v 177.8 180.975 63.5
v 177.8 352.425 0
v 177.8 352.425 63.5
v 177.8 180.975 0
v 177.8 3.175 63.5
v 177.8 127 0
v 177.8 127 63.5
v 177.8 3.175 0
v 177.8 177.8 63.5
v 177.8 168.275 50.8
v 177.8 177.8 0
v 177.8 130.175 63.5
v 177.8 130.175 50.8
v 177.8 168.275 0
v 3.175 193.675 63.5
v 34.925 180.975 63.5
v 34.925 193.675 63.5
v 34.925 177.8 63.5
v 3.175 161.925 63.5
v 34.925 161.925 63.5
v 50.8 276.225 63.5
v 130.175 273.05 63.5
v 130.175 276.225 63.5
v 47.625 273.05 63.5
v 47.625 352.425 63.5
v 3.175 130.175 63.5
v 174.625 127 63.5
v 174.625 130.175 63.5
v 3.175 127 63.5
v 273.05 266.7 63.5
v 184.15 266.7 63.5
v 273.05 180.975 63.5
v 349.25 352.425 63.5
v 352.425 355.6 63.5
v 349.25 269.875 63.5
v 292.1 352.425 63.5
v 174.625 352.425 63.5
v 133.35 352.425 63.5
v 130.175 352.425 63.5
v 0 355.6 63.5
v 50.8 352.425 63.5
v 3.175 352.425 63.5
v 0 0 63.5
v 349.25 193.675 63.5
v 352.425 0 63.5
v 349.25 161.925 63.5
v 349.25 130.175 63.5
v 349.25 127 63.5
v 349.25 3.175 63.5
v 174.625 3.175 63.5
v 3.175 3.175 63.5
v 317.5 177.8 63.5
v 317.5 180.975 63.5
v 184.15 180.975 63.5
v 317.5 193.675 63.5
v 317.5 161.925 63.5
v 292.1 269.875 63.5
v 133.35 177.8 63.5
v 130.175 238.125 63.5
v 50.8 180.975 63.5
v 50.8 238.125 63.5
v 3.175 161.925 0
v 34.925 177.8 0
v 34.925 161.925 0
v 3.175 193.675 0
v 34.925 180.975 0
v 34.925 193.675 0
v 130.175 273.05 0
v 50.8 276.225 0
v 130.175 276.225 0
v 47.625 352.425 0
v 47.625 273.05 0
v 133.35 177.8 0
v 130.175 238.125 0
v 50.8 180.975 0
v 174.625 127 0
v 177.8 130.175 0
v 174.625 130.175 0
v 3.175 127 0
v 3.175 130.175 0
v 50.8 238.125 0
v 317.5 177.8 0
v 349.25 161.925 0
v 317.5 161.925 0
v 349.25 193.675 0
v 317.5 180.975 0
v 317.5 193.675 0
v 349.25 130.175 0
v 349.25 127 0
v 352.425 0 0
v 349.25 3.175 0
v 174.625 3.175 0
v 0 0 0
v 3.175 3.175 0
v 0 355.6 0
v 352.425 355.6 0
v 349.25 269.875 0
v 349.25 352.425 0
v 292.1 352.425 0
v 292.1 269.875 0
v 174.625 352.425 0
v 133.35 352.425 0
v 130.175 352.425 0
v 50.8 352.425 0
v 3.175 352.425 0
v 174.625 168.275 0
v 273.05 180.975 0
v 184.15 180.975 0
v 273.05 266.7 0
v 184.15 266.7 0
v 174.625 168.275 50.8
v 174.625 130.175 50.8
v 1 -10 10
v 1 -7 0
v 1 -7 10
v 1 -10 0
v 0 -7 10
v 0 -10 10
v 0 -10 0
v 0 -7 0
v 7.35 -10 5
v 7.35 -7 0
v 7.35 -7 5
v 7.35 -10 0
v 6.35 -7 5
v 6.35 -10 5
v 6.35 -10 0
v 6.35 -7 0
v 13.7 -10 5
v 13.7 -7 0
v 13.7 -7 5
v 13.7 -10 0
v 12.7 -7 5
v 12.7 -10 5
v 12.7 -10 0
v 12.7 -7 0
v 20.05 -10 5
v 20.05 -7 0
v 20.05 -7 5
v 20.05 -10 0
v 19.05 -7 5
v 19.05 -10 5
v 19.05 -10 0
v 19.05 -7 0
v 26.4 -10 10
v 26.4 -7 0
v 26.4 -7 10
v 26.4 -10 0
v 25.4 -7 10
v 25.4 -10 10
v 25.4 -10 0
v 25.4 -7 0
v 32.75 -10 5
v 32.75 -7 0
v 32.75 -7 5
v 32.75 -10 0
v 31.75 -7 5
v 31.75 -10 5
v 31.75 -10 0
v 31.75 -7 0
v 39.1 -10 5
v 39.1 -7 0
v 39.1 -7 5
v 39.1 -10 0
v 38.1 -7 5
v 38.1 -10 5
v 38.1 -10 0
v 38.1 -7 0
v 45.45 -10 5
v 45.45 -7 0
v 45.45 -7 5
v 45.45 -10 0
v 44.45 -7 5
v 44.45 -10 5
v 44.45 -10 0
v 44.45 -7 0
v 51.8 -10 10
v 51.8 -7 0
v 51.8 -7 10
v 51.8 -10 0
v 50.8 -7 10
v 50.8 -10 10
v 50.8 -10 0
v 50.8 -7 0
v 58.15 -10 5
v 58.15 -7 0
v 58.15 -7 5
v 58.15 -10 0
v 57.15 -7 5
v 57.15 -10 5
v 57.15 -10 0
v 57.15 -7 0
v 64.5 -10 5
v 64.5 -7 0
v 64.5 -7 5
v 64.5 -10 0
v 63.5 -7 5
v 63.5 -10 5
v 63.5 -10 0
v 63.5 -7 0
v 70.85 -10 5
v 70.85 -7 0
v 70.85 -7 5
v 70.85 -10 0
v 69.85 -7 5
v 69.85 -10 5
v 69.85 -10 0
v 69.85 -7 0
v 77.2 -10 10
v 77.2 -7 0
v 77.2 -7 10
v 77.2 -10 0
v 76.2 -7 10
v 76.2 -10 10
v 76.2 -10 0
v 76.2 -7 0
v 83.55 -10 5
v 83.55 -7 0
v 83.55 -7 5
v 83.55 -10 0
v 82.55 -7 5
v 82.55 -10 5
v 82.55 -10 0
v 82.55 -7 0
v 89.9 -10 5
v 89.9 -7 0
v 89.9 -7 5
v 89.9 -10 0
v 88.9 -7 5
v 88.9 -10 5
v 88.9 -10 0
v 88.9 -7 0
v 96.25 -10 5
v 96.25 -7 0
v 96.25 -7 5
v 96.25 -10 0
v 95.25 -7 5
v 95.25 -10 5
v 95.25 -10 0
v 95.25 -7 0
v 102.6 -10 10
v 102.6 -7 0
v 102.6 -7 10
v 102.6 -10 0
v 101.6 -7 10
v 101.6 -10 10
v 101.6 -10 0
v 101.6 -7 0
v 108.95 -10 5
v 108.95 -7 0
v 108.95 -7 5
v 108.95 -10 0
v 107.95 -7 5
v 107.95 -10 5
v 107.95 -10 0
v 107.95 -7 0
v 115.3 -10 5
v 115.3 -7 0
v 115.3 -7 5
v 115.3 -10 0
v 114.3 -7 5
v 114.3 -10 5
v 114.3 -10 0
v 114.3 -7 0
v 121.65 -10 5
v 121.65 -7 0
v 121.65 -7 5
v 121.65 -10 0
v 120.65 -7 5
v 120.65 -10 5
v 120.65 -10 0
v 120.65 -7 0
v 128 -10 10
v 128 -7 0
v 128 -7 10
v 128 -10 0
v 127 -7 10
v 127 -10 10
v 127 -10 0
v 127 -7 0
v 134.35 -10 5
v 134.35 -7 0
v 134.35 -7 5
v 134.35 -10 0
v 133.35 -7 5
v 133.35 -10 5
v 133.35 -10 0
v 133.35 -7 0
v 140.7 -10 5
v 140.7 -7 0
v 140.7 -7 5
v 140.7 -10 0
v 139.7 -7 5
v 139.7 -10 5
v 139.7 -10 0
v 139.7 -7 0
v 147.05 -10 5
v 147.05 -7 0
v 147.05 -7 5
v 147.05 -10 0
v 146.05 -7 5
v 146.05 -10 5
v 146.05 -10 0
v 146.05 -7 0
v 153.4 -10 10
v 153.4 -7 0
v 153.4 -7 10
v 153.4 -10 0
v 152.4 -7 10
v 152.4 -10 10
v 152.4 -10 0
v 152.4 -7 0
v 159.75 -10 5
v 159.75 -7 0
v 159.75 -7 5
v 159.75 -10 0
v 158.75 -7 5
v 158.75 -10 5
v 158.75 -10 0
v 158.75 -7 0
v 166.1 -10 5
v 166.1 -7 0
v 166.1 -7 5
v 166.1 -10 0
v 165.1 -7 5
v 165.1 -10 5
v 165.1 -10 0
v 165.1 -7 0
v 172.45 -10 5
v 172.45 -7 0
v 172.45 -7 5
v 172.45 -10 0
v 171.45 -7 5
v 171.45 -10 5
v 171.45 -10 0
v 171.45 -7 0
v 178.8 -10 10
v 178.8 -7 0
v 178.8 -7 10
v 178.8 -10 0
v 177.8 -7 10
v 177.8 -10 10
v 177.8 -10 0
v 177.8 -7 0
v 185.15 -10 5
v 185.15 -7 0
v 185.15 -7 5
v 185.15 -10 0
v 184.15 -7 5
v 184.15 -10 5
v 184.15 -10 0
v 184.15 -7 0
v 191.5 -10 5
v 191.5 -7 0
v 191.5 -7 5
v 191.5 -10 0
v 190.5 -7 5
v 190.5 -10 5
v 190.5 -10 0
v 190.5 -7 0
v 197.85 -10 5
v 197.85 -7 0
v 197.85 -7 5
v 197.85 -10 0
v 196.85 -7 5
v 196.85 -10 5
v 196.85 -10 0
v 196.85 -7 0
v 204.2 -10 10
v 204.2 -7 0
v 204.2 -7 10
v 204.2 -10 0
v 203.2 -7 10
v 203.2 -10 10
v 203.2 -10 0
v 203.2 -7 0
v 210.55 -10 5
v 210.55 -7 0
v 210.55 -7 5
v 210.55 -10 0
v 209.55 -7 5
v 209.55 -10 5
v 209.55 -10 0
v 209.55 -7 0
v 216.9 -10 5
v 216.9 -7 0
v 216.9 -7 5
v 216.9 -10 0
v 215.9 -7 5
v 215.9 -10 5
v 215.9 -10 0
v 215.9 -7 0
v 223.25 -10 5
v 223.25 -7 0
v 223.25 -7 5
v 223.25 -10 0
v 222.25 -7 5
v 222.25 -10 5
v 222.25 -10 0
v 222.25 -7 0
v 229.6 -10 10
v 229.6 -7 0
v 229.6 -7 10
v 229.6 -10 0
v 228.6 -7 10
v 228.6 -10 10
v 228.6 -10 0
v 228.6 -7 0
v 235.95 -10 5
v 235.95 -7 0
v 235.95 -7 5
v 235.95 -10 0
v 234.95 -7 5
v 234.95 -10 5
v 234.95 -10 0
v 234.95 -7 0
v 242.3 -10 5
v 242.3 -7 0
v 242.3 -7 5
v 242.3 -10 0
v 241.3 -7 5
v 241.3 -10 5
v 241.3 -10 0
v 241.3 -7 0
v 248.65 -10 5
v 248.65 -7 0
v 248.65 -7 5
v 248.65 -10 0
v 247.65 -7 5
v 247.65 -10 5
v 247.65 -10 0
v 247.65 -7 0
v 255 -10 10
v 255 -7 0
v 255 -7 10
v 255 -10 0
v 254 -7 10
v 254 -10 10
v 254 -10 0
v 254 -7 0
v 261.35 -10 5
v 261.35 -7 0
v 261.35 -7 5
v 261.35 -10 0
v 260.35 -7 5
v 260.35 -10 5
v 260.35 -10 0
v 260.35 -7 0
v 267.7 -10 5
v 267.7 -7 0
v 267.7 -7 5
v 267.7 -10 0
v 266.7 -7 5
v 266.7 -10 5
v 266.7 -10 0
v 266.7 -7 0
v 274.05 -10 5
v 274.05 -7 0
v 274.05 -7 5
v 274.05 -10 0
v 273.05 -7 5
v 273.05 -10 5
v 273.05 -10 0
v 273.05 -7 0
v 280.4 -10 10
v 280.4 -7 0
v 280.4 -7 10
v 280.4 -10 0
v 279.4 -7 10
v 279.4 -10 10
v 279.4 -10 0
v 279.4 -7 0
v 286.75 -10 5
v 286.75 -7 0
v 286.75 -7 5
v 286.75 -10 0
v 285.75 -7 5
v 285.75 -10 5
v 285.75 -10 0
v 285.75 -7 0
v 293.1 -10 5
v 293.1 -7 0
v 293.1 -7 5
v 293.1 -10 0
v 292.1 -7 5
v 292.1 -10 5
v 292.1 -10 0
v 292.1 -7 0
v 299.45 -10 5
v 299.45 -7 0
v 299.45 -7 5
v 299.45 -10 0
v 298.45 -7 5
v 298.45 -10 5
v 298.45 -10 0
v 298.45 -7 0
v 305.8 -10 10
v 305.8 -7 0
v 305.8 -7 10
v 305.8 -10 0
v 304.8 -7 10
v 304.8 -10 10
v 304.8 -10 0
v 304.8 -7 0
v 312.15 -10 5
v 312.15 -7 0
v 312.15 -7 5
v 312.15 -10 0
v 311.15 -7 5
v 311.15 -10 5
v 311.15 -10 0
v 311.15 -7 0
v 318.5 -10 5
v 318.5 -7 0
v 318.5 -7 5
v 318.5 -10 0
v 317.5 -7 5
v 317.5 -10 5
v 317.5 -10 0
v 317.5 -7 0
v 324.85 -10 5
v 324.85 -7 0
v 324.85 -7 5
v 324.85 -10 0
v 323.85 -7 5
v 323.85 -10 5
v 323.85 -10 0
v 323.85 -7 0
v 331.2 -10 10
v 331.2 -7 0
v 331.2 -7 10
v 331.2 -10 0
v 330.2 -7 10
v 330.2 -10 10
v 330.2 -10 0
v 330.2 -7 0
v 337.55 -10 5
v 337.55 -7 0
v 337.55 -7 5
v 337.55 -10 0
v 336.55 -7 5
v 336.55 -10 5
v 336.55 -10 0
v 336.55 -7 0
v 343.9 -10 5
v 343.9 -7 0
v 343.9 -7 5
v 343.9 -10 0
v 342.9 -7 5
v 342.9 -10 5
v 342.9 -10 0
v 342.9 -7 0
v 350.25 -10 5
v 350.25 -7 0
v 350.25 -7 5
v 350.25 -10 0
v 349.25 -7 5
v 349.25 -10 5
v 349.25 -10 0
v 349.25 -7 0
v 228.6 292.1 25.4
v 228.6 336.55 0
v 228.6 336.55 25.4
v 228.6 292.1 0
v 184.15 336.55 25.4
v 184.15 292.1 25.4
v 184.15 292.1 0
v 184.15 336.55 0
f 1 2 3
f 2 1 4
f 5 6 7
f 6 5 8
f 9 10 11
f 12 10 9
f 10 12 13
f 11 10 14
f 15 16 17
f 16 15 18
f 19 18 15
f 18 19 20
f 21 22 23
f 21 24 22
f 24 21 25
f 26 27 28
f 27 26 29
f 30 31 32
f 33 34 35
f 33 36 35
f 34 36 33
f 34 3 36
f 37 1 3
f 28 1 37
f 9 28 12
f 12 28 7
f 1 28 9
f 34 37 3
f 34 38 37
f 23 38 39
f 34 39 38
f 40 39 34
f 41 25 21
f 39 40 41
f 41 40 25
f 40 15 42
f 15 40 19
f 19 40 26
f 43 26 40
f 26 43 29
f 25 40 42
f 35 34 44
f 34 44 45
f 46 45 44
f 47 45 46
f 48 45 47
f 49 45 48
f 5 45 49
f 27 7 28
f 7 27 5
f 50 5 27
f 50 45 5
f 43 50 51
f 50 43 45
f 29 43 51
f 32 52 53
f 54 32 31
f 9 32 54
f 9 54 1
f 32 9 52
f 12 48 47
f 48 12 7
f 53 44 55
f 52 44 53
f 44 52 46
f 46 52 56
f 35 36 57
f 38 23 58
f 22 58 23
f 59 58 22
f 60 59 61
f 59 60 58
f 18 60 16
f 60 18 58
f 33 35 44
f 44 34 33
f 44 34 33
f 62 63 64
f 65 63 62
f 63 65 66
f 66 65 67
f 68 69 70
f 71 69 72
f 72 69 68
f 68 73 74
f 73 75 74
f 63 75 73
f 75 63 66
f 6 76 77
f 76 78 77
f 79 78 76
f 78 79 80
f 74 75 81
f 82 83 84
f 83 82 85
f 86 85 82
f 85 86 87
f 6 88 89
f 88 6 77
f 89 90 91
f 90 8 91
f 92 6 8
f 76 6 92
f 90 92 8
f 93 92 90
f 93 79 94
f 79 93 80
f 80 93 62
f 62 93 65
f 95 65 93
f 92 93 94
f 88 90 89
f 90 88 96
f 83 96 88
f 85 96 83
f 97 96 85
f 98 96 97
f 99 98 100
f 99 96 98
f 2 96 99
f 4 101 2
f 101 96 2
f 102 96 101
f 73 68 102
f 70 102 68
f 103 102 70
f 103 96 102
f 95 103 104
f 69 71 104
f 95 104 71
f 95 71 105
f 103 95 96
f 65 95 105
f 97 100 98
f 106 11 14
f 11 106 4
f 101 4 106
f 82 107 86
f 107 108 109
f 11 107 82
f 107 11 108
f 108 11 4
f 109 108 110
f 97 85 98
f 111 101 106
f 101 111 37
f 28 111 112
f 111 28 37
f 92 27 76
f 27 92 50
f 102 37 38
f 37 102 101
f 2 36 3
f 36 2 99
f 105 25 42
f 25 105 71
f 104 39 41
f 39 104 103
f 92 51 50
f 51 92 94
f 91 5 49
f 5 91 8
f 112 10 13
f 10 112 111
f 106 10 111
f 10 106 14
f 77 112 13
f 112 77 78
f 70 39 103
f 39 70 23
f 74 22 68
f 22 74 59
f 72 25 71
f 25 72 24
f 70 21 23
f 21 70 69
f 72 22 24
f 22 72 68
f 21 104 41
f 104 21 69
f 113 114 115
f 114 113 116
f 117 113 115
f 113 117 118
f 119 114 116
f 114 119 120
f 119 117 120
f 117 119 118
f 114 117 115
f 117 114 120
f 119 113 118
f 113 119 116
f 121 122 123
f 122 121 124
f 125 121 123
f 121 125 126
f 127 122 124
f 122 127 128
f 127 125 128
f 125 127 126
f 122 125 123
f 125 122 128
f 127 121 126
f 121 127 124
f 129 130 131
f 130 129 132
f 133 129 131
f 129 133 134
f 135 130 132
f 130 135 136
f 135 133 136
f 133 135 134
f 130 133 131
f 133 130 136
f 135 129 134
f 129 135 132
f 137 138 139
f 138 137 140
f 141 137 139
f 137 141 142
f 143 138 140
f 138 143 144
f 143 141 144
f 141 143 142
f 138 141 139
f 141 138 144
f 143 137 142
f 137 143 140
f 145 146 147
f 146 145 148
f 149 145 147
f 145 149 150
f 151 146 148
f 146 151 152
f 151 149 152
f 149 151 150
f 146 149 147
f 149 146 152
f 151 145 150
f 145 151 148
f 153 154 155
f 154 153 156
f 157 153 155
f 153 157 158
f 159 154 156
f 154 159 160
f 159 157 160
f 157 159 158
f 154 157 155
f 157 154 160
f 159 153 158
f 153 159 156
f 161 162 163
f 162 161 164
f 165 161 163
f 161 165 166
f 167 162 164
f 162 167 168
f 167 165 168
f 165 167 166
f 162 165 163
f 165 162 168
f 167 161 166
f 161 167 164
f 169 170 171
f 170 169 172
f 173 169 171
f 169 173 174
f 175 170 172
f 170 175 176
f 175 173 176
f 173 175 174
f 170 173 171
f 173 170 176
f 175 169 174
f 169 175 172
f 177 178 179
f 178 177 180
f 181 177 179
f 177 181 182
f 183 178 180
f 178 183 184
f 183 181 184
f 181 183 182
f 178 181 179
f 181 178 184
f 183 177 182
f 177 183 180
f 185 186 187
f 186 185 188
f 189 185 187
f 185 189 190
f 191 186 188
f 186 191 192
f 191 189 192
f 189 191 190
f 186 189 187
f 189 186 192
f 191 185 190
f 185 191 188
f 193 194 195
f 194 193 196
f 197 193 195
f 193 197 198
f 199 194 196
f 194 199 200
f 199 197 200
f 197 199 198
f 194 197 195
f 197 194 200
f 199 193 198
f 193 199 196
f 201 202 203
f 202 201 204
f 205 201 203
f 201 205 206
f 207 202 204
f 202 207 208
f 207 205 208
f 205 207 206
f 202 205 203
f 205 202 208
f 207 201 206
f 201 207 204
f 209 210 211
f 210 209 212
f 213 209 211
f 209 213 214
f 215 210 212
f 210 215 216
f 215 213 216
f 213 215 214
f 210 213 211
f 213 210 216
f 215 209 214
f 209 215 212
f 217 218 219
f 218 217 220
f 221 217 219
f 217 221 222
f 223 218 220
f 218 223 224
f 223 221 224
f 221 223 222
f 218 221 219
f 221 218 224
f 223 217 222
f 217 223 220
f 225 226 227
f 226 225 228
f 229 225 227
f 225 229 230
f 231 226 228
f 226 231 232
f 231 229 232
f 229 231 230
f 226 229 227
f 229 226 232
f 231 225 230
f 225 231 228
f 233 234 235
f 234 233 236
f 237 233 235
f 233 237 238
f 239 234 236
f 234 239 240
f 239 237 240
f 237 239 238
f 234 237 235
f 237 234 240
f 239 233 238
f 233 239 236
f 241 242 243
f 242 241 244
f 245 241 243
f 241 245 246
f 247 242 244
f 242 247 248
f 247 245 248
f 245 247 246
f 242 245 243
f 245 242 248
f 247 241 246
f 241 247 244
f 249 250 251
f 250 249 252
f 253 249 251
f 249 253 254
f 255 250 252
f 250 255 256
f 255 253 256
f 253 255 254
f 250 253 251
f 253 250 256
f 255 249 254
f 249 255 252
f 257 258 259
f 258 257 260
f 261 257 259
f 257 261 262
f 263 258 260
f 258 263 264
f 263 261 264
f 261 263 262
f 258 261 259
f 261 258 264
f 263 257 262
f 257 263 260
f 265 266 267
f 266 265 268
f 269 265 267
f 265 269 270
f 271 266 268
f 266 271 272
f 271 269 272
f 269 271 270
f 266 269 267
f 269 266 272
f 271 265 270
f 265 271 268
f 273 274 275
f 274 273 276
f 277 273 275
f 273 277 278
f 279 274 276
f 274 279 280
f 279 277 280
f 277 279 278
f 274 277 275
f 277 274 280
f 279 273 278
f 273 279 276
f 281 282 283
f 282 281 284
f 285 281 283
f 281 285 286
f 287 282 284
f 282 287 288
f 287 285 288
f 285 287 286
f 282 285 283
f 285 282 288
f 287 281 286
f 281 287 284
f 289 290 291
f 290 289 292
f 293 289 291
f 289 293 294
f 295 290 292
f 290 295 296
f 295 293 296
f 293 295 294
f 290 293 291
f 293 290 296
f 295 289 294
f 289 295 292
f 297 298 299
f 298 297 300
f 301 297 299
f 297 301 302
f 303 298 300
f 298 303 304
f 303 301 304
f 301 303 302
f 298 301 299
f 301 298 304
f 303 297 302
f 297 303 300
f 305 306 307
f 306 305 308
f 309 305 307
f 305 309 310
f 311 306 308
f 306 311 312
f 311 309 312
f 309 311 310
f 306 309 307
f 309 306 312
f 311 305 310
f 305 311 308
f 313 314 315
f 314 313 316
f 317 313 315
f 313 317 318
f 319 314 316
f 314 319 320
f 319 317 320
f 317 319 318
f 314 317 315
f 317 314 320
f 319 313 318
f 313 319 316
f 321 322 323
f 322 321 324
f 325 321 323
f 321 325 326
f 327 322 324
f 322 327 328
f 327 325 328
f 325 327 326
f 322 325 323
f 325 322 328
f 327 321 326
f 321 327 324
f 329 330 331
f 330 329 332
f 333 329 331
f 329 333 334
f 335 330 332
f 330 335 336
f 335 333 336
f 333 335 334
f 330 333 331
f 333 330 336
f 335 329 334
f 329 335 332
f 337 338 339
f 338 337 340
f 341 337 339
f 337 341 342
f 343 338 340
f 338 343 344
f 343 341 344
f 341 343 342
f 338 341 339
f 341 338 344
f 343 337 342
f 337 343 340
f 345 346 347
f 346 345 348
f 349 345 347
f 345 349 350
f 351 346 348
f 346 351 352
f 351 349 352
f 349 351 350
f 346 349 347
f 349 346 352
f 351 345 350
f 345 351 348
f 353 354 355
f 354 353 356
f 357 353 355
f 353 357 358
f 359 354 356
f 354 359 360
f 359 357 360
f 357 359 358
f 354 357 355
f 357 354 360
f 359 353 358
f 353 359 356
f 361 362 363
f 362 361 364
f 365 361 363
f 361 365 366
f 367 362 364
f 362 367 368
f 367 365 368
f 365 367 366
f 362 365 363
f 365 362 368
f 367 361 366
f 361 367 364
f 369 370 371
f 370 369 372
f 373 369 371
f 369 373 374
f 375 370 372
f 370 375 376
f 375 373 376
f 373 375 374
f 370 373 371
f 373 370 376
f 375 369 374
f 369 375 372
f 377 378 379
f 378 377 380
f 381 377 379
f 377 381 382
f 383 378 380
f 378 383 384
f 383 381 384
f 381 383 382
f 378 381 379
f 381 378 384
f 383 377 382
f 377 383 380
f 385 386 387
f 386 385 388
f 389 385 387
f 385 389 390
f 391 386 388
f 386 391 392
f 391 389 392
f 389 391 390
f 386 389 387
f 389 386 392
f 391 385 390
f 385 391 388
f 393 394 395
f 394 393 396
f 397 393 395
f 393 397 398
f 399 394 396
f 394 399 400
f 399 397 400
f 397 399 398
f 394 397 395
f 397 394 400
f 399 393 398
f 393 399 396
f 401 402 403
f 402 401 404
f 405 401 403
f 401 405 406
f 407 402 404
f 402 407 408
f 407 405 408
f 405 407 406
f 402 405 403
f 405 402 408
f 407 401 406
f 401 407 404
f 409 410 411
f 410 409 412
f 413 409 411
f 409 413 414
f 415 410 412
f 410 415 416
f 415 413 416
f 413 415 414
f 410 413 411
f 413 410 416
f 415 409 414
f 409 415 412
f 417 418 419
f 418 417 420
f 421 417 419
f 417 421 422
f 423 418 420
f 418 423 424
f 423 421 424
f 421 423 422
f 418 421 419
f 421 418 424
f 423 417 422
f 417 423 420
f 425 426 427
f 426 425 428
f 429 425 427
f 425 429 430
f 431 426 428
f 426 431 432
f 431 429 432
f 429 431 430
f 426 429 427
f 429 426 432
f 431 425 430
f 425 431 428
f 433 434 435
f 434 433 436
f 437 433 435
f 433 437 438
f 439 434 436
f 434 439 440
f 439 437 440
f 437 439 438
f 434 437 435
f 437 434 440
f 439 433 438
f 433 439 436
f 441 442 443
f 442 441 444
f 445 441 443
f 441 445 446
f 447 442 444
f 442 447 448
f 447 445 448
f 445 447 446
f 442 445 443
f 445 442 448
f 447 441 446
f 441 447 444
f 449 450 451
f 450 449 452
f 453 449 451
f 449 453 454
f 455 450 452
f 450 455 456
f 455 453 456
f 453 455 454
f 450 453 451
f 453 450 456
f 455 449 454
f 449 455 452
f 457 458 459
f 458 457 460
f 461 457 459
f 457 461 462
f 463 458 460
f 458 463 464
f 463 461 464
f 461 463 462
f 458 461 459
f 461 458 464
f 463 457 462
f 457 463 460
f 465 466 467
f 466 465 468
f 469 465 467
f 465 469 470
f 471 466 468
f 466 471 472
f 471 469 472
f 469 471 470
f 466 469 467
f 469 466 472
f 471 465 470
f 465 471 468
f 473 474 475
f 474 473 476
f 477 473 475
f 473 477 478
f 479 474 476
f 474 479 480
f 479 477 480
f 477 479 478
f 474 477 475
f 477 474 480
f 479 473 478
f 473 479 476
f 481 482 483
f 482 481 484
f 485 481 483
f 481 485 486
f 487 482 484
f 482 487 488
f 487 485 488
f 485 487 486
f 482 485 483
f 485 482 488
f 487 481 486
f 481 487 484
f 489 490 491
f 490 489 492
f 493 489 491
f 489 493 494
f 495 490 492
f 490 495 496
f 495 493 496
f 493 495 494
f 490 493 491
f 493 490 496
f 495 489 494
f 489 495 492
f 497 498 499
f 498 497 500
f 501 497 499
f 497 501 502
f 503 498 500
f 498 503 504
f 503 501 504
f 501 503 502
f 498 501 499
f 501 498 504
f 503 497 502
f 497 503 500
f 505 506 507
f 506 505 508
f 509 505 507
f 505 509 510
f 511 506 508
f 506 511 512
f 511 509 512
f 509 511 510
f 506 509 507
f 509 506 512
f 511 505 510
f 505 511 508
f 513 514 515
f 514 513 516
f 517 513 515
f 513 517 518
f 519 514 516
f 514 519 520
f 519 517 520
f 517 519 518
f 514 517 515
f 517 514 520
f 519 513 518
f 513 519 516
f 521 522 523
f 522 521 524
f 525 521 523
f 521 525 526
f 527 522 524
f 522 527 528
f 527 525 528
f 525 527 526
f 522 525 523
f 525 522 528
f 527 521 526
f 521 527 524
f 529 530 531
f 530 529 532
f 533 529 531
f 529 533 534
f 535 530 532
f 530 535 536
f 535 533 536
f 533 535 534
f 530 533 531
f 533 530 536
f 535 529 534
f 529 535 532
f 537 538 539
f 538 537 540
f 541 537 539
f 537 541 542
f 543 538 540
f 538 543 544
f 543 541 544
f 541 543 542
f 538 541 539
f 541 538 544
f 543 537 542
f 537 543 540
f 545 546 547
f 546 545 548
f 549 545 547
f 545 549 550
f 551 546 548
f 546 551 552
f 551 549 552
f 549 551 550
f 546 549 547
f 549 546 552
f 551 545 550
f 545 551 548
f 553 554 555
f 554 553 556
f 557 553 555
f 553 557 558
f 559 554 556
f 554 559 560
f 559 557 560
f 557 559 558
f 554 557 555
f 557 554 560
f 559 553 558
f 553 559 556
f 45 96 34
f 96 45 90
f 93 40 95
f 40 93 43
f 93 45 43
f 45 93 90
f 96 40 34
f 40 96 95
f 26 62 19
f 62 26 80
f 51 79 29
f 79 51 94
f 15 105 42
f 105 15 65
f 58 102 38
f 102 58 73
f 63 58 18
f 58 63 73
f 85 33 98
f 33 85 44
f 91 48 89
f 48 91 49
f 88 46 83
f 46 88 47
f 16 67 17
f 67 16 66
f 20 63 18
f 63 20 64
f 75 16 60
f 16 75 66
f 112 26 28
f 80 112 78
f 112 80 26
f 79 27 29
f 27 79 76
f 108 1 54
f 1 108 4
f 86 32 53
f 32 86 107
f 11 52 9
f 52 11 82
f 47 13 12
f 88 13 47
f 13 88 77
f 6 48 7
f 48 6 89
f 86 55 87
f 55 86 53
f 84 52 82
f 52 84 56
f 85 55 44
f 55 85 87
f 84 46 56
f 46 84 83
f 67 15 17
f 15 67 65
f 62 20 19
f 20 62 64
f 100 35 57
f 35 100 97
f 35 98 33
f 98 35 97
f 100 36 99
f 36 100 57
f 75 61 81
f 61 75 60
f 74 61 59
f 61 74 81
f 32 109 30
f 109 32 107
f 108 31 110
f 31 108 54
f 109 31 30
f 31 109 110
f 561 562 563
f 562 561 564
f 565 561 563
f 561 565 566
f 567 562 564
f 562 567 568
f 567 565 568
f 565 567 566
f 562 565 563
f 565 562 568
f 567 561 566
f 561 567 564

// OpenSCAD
roomsize = 27;
wallthickness = .5; // In feet
scalefactor = 6.35; // scale factor - 1 foot eq 1/4 inch
wallheight = 10;
elevatorsize = 5;
closetsize = 14;
bathroomdepth=13;
bathroomwidth=9;
kingbedsize = 7;
stairsize = 5;

backwalloffset = wallthickness + roomsize + wallthickness + roomsize + wallthickness;
interiorwallsize = roomsize + wallthickness + roomsize + wallthickness;
halfinteriorwallsize = wallthickness + roomsize + wallthickness;
farsidewallposition = wallthickness + roomsize + wallthickness + roomsize;

module bfwall()
{
     backwallsize = wallthickness + roomsize + wallthickness + roomsize + wallthickness;
     cube([backwallsize * scalefactor,wallthickness*scalefactor,wallheight*scalefactor]);
}
module midsidewall()
{
     cube([wallthickness * scalefactor,interiorwallsize*scalefactor,wallheight*scalefactor]);
}

module midhalfsidewall()
{
     cube([wallthickness * scalefactor,halfinteriorwallsize*scalefactor,wallheight*scalefactor]);
}

module midroomdivider()
{
     cube([roomsize * scalefactor,wallthickness * scalefactor,wallheight*scalefactor]);
}

module utilityroomdivider()
{
     cube([(roomsize - 11.5) * scalefactor,wallthickness * scalefactor,wallheight*scalefactor]);
}

module elevator()
{
     cube([elevatorsize * scalefactor,elevatorsize * scalefactor, wallheight*scalefactor]);

}

module bathroom()
{

    cube([bathroomdepth * scalefactor, bathroomwidth * scalefactor, wallheight * scalefactor]);

}

module kingbed()
{
      cube([7 * scalefactor, 7 * scalefactor, 4 * scalefactor]);   
}

module closet()
{
      cube([closetsize * scalefactor, closetsize * scalefactor, wallheight * scalefactor]);
}

module stairs()
{
   cube([stairsize * scalefactor, stairsize * scalefactor, wallheight * scalefactor]);

}

module interiordoubledoor()
{
     rotate([0,0,90]) cube([(60/12) * scalefactor,(wallthickness * scalefactor) + 5,(80 / 12) * scalefactor]);

}

module storageroom()
{
       cube([13 * scalefactor, wallthickness * scalefactor, wallheight * scalefactor]);
       cube([wallthickness * scalefactor, 13 * scalefactor, wallheight * scalefactor]);

}

module hallwayopening()
{
    cube([(wallthickness + 2) * scalefactor, 6 * scalefactor, 8 * scalefactor]);

}

translate([0,0,0]) bfwall(); // Front Wall
translate([0,backwalloffset * scalefactor,0]) bfwall();
midwallposition = wallthickness + roomsize;
translate([0,wallthickness * scalefactor,0]) midsidewall();
difference(){
    translate([midwallposition * scalefactor,wallthickness * scalefactor,0]) midsidewall();
    translate([(midwallposition * scalefactor)-1,(wallthickness + roomsize + wallthickness - 7.5) * scalefactor,0]) hallwayopening(); 
    }
// Hallway
midhalfwallposition = wallthickness + roomsize;
translate([(midhalfwallposition - 7) * scalefactor,(wallthickness + roomsize + wallthickness) * scalefactor,0]) midhalfsidewall();

translate([farsidewallposition * scalefactor,wallthickness * scalefactor,0]) midsidewall();
roomdivposition = wallthickness + roomsize + wallthickness;
translate([(wallthickness + 5) * scalefactor,roomdivposition * scalefactor,0]) utilityroomdivider();
translate([wallthickness * scalefactor,(roomdivposition - 8) * scalefactor,0]) midroomdivider();
translate([(wallthickness + roomsize + wallthickness) * scalefactor,roomdivposition * scalefactor,0]) midroomdivider();
translate([(wallthickness + roomsize + wallthickness) * scalefactor,(roomdivposition - 8) * scalefactor,0]) midroomdivider();
elevatorpositionx = wallthickness + roomsize + wallthickness + roomsize - elevatorsize;
elevatorpositiony = wallthickness + roomsize + wallthickness - (elevatorsize / 2);

translate([elevatorpositionx * scalefactor,elevatorpositiony * scalefactor,0]) elevator();

stairpositionx = wallthickness;
stairpositiony = wallthickness + roomsize + wallthickness - (stairsize / 2);

translate([stairpositionx * scalefactor,stairpositiony * scalefactor,0]) stairs();


firstbathroompositionx = wallthickness + roomsize + wallthickness + roomsize - bathroomwidth;
firstbathroompositiony = wallthickness + roomsize + wallthickness + roomsize + wallthickness;

translate([firstbathroompositionx * scalefactor,firstbathroompositiony * scalefactor,0]) rotate([0,0,-90]) bathroom();

secondbathroompositionx = wallthickness + roomsize - bathroomwidth - wallthickness -  10;
secondbathroompositiony = wallthickness + roomsize + wallthickness + wallthickness;

translate([secondbathroompositionx * scalefactor,secondbathroompositiony * scalefactor,0]) bathroom();



closetpositionx = wallthickness + roomsize + wallthickness + 1;
closetpositiony = wallthickness + roomsize + wallthickness;
translate([closetpositionx * scalefactor, closetpositiony * scalefactor, 0]) closet();



bedpositionx = wallthickness + roomsize + wallthickness + 1;
bedpositiony = wallthickness + roomsize + wallthickness + roomsize - 9;
translate([bedpositionx * scalefactor, bedpositiony * scalefactor, 0]) kingbed();

storageroomx = wallthickness + bathroomwidth - 2;
storageroomy = wallthickness + roomsize + wallthickness + roomsize - 12;
translate([storageroomx * scalefactor,storageroomy * scalefactor,0]) storageroom();

ht = 5;
for(x = [ 0 : 1 : 55] ){
      if (x % 4){ 
         echo ("H5");
         ht = 5;
         translate([x * scalefactor,-10, 0]) cube([1,3,ht]);
       } else {
         echo ("H10");
         ht = 10;
         translate([x * scalefactor,-10, 0]) cube([1,3,ht]);
       }
     
     }
     
translate([roomsize * scalefactor,-40,0]) text("Front",size = 20);
translate([roomsize * scalefactor - 100,400,0]) text("Back - Door To Porch",size = 20);

translate([-20,roomsize * scalefactor / 2 ,0]) rotate([0,0,90]) text("Door To Shop",size = 20);
translate([-50,roomsize * scalefactor / 2 + 20 ,0]) rotate([0,0,90]) text("Stairs To Deck",size = 15);

translate([420,3 * roomsize * scalefactor / 2 ,0]) rotate([0,0,-90]) text("Door To Garage",size = 20);
     
